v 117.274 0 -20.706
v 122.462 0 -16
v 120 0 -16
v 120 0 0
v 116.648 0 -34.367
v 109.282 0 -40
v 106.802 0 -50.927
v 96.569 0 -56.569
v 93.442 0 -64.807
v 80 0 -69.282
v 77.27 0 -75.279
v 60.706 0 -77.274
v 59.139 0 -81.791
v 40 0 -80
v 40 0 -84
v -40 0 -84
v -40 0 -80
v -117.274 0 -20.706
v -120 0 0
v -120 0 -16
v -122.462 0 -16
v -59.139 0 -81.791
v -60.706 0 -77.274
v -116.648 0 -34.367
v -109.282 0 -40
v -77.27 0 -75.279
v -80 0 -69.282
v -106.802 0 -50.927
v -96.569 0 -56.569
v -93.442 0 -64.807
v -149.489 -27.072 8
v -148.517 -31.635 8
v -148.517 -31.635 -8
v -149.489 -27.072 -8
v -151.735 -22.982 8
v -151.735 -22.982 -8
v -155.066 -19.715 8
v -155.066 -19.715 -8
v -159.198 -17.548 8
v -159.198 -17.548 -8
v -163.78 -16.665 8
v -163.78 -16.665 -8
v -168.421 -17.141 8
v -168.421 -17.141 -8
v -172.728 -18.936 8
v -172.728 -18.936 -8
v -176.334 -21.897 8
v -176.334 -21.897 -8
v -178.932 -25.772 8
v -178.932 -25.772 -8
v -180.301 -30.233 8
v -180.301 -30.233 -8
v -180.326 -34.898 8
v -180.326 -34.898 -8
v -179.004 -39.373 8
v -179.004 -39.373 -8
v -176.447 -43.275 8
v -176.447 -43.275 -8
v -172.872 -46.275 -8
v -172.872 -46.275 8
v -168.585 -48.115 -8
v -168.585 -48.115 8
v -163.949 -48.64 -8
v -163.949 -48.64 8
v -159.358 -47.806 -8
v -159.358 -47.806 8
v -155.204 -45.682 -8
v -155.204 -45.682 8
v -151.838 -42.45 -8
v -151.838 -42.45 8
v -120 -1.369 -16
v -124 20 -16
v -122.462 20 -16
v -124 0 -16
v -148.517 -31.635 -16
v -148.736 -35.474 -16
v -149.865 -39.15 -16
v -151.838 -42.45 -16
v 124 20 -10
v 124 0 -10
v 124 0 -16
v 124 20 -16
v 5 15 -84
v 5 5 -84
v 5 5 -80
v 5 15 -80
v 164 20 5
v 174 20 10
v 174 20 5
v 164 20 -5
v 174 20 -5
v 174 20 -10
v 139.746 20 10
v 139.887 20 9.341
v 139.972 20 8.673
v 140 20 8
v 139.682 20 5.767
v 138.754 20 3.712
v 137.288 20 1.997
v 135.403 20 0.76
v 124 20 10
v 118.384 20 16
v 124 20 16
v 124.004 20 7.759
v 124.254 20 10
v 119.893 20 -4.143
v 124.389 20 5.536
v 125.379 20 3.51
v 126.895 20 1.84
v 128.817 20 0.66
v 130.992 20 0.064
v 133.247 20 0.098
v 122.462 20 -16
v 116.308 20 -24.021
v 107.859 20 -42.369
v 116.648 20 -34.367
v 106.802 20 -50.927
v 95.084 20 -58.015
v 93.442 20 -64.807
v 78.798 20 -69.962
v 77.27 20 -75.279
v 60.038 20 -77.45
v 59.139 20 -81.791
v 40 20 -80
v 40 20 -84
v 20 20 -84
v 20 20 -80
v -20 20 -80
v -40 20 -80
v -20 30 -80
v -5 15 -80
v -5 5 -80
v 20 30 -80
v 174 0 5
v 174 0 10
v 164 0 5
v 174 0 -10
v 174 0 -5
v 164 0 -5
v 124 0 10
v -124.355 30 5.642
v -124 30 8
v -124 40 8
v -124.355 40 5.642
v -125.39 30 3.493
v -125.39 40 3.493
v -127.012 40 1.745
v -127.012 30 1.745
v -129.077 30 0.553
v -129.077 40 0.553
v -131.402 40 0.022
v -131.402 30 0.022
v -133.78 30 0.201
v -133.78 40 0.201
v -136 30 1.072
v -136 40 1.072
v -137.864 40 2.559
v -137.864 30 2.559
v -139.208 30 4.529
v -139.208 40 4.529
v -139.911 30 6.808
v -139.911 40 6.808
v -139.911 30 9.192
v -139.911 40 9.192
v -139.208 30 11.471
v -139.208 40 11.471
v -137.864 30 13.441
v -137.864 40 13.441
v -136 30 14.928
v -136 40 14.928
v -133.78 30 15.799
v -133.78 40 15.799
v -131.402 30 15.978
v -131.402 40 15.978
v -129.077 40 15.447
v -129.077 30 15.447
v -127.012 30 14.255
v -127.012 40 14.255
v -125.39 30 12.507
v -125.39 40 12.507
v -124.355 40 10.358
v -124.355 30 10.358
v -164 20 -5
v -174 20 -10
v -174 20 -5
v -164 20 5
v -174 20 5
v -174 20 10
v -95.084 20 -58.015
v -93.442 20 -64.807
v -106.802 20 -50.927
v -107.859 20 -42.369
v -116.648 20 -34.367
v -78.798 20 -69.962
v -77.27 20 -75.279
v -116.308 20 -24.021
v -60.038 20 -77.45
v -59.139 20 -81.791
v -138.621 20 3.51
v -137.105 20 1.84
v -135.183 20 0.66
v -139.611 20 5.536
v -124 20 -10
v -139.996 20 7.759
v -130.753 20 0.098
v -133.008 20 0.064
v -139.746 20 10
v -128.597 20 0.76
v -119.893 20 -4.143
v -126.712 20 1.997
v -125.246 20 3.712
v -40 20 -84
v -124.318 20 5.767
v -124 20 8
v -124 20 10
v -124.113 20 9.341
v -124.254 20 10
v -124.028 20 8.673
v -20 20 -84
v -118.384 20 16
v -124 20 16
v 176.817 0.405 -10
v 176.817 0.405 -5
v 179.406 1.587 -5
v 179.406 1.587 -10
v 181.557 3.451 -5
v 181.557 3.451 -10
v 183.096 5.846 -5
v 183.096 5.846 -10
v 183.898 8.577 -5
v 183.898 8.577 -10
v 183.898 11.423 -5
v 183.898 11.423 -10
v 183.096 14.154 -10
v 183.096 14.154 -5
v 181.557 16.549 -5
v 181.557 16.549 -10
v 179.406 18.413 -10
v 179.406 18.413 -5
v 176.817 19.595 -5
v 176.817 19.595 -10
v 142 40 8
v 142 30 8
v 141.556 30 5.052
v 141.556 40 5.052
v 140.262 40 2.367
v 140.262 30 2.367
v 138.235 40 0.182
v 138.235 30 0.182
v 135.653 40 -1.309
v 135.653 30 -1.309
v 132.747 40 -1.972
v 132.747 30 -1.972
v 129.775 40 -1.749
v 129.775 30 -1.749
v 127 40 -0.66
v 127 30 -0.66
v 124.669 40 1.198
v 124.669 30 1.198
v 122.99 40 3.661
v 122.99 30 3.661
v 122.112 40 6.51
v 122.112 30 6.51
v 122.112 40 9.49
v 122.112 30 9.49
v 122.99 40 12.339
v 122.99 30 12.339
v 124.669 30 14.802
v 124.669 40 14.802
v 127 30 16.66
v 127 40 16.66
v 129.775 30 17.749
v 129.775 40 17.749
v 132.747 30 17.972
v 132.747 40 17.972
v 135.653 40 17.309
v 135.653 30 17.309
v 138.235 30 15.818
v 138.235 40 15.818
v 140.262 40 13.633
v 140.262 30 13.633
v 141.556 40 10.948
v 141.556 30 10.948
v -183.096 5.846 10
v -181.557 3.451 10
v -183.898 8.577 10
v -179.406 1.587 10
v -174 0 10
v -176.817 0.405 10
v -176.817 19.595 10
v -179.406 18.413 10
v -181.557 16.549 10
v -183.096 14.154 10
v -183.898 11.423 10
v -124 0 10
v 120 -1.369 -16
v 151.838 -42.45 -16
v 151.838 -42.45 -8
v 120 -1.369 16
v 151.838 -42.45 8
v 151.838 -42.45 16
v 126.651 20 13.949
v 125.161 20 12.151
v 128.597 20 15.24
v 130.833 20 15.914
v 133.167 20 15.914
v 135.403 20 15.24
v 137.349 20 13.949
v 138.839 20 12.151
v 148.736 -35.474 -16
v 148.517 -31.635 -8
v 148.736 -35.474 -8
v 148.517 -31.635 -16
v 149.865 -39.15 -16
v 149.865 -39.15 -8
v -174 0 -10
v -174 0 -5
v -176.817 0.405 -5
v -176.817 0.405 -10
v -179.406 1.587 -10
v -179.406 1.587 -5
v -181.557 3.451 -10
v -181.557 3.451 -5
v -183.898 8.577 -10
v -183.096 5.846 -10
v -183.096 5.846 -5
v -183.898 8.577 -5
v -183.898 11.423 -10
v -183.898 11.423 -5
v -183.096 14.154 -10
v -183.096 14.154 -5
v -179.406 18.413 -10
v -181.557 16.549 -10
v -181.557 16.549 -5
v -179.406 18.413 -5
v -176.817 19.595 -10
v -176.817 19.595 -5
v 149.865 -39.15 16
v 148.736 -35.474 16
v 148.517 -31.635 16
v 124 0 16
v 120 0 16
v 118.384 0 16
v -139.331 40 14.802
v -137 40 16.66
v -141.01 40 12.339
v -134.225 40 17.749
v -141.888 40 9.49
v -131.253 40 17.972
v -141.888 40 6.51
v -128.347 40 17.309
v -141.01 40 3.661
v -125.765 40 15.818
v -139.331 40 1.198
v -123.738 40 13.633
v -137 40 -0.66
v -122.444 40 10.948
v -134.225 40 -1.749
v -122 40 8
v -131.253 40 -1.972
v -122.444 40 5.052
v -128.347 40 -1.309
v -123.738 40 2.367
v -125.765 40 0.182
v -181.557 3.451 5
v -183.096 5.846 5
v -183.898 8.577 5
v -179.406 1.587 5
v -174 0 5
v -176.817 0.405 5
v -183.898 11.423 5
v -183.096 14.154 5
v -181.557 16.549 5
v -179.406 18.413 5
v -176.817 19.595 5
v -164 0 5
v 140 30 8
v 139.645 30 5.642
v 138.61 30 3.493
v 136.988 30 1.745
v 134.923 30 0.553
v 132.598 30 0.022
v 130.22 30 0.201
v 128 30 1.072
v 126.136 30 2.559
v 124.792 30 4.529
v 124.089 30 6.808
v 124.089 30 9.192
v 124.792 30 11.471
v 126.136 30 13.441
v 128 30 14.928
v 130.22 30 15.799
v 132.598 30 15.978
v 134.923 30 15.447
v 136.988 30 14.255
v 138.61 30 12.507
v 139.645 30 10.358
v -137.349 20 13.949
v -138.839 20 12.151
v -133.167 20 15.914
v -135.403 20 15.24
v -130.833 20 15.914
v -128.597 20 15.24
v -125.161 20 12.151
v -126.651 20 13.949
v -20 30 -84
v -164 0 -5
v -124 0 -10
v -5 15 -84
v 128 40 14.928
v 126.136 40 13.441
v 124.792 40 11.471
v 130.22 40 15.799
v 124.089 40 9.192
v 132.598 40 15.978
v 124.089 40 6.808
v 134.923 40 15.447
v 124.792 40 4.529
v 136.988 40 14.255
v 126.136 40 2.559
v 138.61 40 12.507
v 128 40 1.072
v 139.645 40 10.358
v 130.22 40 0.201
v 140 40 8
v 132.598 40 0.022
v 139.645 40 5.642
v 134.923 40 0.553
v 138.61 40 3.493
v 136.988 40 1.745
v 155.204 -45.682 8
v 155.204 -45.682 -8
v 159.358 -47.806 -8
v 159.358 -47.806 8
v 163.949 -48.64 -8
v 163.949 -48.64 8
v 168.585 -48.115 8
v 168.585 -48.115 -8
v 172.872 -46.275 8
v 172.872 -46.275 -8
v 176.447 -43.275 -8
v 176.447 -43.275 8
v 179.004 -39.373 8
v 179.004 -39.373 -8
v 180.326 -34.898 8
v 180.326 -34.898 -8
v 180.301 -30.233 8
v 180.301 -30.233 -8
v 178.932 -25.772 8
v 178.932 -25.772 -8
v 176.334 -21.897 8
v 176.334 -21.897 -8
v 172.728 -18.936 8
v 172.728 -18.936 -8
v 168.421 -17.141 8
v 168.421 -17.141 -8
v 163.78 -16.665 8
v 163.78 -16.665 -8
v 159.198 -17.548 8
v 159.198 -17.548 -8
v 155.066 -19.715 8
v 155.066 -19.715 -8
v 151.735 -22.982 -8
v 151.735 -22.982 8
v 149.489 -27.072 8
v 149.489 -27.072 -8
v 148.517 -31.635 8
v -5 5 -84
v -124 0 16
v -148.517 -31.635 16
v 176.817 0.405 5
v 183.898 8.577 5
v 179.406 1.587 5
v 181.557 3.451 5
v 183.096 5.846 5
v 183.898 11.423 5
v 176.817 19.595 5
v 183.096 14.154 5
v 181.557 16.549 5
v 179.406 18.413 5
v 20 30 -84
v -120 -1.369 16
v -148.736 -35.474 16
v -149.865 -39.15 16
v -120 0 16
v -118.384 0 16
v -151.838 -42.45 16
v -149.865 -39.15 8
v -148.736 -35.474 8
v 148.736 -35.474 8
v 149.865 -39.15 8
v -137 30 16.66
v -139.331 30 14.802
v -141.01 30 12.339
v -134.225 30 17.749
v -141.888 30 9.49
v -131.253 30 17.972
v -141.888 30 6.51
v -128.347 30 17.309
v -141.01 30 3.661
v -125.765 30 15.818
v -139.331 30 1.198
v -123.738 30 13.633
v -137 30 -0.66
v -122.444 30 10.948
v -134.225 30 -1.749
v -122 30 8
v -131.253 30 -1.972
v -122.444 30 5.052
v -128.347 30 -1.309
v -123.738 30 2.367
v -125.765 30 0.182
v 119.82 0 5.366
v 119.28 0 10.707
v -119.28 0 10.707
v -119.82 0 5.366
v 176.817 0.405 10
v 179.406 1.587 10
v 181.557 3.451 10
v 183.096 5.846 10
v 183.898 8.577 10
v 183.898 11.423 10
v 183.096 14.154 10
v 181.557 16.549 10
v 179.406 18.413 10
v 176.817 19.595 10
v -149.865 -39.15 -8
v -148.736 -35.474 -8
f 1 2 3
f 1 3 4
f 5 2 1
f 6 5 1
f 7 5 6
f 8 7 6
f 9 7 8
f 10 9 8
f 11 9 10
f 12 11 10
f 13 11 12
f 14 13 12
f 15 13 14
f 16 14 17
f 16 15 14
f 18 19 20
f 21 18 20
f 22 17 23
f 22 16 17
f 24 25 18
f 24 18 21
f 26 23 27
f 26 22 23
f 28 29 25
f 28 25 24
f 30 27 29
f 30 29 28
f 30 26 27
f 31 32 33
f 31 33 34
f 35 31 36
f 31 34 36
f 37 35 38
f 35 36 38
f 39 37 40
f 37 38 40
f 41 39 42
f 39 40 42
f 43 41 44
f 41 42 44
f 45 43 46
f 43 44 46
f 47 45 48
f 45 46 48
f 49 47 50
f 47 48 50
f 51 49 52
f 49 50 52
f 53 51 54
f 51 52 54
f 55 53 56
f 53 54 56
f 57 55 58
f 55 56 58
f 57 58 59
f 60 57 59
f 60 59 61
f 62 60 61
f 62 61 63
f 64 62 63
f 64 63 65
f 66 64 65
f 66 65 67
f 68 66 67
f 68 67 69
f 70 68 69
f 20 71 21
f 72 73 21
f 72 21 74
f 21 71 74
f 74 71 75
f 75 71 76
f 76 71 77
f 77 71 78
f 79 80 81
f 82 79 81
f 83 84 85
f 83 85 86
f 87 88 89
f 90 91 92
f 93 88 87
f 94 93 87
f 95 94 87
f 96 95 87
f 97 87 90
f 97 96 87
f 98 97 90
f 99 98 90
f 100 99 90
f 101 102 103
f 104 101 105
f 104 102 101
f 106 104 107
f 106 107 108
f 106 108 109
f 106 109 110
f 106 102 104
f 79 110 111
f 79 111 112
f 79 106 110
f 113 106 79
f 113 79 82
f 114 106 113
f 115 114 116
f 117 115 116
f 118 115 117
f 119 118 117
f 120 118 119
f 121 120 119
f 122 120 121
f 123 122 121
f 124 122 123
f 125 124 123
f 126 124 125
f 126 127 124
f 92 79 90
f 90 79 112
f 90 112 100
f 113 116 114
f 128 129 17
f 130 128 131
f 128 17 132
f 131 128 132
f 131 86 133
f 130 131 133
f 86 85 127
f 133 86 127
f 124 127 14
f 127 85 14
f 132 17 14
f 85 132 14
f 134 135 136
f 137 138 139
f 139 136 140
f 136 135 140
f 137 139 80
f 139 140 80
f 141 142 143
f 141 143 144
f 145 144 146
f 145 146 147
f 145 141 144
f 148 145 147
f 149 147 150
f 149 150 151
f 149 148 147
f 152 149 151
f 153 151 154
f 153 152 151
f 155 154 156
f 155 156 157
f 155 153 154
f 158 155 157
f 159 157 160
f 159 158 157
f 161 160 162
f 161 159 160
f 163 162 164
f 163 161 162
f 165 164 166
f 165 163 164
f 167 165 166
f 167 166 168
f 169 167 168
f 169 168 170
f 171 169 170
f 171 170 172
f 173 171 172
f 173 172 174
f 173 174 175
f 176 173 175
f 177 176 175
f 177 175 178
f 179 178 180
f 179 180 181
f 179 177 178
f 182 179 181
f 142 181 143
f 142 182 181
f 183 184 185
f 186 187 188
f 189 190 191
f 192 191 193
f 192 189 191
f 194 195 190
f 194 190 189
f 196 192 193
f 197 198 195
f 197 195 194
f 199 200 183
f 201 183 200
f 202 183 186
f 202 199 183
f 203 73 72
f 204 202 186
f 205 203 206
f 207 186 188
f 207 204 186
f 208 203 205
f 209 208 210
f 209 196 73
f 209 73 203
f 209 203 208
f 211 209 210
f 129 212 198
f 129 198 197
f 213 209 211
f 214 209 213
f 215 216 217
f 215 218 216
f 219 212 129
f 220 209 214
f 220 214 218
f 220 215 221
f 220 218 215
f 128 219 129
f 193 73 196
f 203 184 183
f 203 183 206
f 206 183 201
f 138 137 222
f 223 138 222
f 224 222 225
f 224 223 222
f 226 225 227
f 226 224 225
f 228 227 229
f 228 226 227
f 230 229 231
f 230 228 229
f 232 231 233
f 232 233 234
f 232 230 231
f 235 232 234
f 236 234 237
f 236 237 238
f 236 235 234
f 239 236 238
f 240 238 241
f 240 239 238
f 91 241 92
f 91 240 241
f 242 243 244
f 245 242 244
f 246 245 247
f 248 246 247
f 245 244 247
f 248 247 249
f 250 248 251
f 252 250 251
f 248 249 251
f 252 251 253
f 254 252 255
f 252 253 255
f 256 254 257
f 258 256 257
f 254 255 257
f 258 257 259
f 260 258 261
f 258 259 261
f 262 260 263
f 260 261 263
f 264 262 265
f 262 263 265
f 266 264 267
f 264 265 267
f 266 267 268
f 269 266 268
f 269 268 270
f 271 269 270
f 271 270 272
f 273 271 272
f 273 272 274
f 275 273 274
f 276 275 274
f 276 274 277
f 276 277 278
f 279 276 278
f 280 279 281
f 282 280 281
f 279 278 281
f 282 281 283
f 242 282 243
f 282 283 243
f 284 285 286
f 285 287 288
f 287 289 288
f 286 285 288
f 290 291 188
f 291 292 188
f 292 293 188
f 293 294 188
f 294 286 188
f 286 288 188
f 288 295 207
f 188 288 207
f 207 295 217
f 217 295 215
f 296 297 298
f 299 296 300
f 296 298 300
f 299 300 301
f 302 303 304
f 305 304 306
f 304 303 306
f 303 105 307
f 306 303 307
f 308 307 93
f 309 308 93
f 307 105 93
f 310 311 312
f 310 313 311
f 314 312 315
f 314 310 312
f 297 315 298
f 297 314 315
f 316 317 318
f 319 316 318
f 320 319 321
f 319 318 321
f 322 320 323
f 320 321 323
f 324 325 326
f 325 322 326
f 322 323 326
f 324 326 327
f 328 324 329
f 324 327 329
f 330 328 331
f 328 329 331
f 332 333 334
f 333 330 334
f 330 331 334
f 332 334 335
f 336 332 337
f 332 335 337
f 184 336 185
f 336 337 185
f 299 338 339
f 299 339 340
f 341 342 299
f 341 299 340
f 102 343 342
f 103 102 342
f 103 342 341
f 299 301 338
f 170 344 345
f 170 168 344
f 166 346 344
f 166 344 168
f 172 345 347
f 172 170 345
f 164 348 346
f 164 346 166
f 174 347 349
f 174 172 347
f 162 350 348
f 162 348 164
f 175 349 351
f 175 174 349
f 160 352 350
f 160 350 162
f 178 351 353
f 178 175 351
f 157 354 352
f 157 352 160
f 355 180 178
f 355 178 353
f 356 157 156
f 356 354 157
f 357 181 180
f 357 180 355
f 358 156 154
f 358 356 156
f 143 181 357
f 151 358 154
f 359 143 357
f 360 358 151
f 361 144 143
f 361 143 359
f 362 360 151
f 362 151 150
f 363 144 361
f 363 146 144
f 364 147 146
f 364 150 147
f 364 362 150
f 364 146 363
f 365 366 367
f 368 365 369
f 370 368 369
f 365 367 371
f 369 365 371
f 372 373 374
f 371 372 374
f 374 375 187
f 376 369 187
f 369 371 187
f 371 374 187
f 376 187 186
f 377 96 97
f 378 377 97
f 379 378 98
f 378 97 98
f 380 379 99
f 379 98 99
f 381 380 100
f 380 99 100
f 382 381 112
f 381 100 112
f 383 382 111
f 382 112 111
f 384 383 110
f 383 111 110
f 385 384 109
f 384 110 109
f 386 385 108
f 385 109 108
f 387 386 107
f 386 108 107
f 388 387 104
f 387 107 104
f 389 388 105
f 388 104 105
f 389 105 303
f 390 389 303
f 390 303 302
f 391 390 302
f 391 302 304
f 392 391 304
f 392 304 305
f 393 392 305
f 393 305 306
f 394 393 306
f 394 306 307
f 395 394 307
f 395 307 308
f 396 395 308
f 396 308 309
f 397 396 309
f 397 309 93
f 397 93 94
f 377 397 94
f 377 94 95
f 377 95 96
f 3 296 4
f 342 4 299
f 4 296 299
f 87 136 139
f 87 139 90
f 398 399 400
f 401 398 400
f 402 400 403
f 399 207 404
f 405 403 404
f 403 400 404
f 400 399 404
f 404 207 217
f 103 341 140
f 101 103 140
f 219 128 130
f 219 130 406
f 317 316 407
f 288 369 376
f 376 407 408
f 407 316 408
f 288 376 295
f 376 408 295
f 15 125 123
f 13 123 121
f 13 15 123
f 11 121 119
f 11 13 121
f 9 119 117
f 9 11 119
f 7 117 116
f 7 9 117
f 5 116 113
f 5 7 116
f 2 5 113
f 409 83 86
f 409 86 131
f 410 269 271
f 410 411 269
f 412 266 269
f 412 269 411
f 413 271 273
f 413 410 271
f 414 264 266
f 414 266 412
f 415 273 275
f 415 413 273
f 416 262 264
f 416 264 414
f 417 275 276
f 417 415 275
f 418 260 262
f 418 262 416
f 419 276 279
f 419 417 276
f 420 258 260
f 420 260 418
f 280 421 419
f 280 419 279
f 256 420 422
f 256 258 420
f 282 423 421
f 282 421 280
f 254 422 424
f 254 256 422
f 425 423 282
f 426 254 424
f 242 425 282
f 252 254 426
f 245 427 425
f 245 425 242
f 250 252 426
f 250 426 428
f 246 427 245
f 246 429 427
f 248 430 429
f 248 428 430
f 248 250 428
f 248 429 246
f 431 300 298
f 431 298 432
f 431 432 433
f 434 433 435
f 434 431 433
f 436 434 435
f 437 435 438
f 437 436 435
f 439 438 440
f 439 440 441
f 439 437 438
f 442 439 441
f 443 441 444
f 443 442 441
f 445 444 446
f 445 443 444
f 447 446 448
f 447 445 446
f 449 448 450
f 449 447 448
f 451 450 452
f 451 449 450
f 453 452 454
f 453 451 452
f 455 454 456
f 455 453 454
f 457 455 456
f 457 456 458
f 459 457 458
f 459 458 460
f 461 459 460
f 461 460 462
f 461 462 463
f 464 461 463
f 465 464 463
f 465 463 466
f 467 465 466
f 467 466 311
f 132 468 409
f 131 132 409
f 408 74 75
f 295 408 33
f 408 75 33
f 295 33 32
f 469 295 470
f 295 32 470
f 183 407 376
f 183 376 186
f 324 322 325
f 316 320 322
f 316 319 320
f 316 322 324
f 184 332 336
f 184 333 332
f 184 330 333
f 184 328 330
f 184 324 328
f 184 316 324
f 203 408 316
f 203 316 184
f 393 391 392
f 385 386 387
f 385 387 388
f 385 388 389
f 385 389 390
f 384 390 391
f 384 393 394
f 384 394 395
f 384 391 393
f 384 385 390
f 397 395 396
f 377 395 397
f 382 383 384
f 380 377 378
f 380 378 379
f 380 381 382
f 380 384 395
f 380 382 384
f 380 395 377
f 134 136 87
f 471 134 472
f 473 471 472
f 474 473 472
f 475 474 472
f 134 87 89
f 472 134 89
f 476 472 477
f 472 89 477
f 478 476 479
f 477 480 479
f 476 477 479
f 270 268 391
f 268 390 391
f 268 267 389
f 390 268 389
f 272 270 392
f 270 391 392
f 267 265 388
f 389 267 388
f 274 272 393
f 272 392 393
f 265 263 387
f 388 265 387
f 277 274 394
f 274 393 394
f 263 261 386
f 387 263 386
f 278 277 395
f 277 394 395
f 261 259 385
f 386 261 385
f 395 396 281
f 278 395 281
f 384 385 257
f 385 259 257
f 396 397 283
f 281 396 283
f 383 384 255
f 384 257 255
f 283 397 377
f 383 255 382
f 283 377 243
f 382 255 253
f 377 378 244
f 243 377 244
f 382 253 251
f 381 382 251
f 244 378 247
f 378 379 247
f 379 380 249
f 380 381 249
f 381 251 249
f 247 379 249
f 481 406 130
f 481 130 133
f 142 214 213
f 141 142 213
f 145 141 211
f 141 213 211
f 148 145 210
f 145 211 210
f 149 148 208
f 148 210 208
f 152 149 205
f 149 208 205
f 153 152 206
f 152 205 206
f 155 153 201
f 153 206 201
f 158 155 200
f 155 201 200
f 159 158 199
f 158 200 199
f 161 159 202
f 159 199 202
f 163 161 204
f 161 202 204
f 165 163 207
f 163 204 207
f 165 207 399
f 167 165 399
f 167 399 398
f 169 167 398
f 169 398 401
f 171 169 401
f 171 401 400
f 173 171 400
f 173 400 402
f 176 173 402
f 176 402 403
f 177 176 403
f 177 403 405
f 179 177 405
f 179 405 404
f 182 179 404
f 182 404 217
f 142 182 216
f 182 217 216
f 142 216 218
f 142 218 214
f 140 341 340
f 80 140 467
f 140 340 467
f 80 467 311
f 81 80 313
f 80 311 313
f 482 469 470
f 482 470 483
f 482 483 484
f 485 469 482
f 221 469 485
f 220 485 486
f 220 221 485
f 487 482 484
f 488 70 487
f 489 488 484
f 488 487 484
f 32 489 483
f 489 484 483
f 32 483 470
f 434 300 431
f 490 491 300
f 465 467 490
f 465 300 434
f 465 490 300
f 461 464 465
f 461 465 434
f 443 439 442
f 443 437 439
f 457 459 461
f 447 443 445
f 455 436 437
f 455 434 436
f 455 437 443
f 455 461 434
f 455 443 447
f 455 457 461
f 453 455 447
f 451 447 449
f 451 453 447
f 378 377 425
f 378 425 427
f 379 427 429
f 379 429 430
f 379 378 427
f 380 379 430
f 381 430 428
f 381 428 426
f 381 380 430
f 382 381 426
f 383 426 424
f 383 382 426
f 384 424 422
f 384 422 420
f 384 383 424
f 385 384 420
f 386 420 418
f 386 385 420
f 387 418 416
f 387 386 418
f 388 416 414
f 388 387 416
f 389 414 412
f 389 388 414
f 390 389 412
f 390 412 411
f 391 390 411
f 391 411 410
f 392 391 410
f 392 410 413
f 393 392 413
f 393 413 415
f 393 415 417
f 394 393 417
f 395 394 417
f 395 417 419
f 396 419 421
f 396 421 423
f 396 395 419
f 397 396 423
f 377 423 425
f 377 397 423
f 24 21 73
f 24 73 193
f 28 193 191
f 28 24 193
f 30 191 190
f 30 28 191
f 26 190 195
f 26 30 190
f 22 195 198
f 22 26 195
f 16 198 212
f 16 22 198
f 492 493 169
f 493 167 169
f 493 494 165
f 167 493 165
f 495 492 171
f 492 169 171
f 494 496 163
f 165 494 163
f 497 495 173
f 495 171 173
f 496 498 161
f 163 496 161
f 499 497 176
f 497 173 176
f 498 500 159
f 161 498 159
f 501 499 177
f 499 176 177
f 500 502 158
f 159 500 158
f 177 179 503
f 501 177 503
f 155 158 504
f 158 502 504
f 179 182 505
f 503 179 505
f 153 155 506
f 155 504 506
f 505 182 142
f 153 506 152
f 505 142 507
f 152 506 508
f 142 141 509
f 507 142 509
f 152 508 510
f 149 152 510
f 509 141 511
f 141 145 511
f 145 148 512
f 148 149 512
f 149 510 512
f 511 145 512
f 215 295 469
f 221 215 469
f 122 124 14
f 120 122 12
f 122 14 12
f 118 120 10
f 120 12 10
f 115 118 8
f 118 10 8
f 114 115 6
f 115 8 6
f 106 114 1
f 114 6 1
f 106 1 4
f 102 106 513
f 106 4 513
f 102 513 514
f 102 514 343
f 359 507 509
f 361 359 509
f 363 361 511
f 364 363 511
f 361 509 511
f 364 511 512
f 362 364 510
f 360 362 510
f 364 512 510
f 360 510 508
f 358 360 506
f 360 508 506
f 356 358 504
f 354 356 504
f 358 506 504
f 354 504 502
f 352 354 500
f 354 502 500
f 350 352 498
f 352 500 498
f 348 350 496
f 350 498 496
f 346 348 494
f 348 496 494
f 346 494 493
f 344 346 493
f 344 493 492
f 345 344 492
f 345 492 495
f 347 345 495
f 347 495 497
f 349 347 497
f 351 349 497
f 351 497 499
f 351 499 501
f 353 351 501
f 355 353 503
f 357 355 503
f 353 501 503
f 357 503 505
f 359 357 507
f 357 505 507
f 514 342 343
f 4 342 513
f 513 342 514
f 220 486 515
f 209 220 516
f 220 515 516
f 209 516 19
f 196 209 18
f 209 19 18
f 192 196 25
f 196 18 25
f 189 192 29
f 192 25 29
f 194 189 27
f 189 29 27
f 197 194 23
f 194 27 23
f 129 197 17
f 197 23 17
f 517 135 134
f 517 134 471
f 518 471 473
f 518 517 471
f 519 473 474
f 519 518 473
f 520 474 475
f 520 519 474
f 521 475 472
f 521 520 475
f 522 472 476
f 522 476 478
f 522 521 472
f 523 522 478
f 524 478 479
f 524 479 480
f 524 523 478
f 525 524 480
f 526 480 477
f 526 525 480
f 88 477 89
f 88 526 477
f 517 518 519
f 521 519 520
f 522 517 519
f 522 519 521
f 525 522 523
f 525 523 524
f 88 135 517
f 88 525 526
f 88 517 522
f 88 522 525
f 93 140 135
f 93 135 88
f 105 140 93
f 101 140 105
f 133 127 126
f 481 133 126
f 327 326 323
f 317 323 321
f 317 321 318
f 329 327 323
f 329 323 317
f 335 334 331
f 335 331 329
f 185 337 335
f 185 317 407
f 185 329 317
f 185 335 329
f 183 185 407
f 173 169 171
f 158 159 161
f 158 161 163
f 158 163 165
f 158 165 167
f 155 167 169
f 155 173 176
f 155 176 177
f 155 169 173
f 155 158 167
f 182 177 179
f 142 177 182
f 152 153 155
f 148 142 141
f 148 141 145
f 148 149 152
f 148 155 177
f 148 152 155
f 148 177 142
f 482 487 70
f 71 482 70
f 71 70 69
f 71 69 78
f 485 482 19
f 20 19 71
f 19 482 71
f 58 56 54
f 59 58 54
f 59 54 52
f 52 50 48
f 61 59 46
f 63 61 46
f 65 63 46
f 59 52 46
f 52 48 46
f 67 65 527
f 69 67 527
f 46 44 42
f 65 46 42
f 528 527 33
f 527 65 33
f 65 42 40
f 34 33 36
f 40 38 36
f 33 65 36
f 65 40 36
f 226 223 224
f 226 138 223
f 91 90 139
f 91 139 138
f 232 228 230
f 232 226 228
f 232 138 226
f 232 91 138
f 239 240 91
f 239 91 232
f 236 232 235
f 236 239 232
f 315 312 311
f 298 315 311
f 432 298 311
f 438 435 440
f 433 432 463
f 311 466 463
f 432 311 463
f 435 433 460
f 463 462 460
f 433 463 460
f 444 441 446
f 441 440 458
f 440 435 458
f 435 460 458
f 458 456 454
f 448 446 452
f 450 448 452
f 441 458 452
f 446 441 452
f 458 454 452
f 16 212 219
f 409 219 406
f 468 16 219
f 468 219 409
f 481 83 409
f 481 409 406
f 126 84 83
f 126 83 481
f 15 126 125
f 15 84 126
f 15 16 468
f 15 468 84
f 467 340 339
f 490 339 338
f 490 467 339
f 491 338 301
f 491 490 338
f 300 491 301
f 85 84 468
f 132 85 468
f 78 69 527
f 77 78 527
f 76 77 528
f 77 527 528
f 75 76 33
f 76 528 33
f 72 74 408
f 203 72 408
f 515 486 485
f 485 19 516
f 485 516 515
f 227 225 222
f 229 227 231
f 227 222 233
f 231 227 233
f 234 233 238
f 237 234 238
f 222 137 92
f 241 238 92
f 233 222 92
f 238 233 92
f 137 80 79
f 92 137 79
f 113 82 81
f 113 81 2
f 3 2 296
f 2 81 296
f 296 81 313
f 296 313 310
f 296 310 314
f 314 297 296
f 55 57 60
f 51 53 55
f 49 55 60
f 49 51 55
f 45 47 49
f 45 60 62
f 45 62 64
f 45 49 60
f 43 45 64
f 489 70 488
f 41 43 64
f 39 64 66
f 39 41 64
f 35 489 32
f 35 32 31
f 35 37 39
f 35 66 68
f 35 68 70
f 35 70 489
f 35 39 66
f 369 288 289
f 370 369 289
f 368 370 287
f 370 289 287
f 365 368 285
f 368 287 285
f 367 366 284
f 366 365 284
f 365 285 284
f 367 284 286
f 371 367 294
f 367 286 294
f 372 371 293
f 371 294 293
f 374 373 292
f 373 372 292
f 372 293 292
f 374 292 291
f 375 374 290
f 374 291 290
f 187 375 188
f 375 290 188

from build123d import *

# Parameters (mm, degrees)
EXTRUDE_1_DEPTH           = 20
SKETCH_18_W               = 10
SKETCH_18_H               = 10
CUT_EXTRUDE_6_DEPTH       = 10
SKETCH_20_W               = 40
SKETCH_20_H               = 4
EXTRUDE_5_DEPTH           = 10
SKETCH_22_R               = 8
EXTRUDE_7_DEPTH           = 10
EXTRUDE_7_2_DEPTH         = 10
SKETCH_23_R               = 10
SKETCH_23_R_2             = 8
EXTRUDE_8_DEPTH           = 10
EXTRUDE_8_2_DEPTH         = 10
SKETCH_8_W                = 4
SKETCH_8_H                = 32
SKETCH_11_W               = 4
SKETCH_11_H               = 32
SKETCH_25_W               = 246.903686524
SKETCH_25_H               = 75.06139437
CUT_EXTRUDE_7_DEPTH       = 30
SKETCH_26_W               = 20
SKETCH_26_H               = 20
EXTRUDE_9_DEPTH           = 60
SKETCH_28_W               = 20
SKETCH_28_H               = 20
EXTRUDE_10_DEPTH          = 60
CUT_EXTRUDE_8_DEPTH       = 60
SKETCH_29_W               = 20
SKETCH_29_H               = 25.723700811
SKETCH_29_H_2             = 33.540144271
CUT_EXTRUDE_9_DEPTH       = 5
SKETCH_30_R               = 16
CUT_EXTRUDE_10_DEPTH      = 19
CUT_EXTRUDE_10_DEPTH_BACK = 85
SKETCH_31_R               = 16
EXTRUDE_11_DEPTH          = 8


with BuildPart() as part:
    # 草图2 → 凸台-拉伸1 (new body)
    with BuildSketch(Plane(origin=(0, 0, 0), x_dir=(1, 0, 0), z_dir=(0, 1, 0))):
        with BuildLine():
            Line((-40, 84), (40, 84))
            ThreePointArc((40, 84), (124, 0), (40, -84))
            Line((40, -84), (-40, -84))
            ThreePointArc((-40, -84), (-124, 0), (-40, 84))
        make_face()
        with BuildLine():
            Line((-40, 80), (40, 80))
            ThreePointArc((40, 80), (120, 0), (40, -80))
            Line((40, -80), (-40, -80))
            ThreePointArc((-40, -80), (-120, 0), (-40, 80))
        make_face(mode=Mode.SUBTRACT)
    extrude(amount=EXTRUDE_1_DEPTH)

    # 草图18 → 切除-拉伸6 (cut)
    with BuildSketch(Plane(origin=(0, 0, -84), x_dir=(-1, 0, 0), z_dir=(0, 0, -1))):
        with Locations((0, 10)):
            Rectangle(SKETCH_18_W, SKETCH_18_H)
    extrude(amount=-CUT_EXTRUDE_6_DEPTH, mode=Mode.SUBTRACT)

    # 草图20 → 凸台-拉伸5 (add)
    with BuildSketch(Plane(origin=(0, 20, 0), x_dir=(1, 0, 0), z_dir=(0, 1, 0))):
        with Locations((0, 82)):
            Rectangle(SKETCH_20_W, SKETCH_20_H)
    extrude(amount=EXTRUDE_5_DEPTH)

    # 扫描1: sweep along a path in 草图9
    with BuildLine(Plane.XY) as sweep_1_path:
        Line((-124, 20), (-124, 0))
        Line((-124, 0), (-155, -40))
    # 草图8 → 扫描1 (sweep)
    with BuildSketch(Plane(origin=(0, 20, 0), x_dir=(1, 0, 0), z_dir=(0, 1, 0))):
        with Locations((-122, 0)):
            Rectangle(SKETCH_8_W, SKETCH_8_H)
    sweep(path=sweep_1_path.line, transition=Transition.RIGHT)

    # 扫描2: sweep along a path in 草图24
    with BuildLine(Plane.XY) as sweep_2_path:
        Line((124, 20), (124, 0))
        Line((124, 0), (155, -40))
    # 草图11 → 扫描2 (sweep)
    with BuildSketch(Plane(origin=(0, 20, 0), x_dir=(1, 0, 0), z_dir=(0, 1, 0))):
        with Locations((122, 0)):
            Rectangle(SKETCH_11_W, SKETCH_11_H)
    sweep(path=sweep_2_path.line, transition=Transition.RIGHT)

    # 草图25 → 切除-拉伸7 (cut)
    with BuildSketch(Plane(origin=(0, 20, 0), x_dir=(1, 0, 0), z_dir=(0, 1, 0))):
        with Locations((0.98973075, -53.530697185)):
            Rectangle(SKETCH_25_W, SKETCH_25_H)
    extrude(amount=-CUT_EXTRUDE_7_DEPTH, mode=Mode.SUBTRACT)



with BuildPart() as body_2:
    # 草图22 → 凸台-拉伸7 (new body)
    with BuildSketch(Plane(origin=(0, 20, 0), x_dir=(1, 0, 0), z_dir=(0, 1, 0))):
        with Locations((-132, -8)):
            Circle(SKETCH_22_R)
    extrude(amount=EXTRUDE_7_DEPTH)


with BuildPart() as body_3:
    # 草图22 → Extrude 7 2 (new body)
    with BuildSketch(Plane(origin=(0, 20, 0), x_dir=(1, 0, 0), z_dir=(0, 1, 0))):
        with Locations((132, -8)):
            Circle(SKETCH_22_R)
    extrude(amount=EXTRUDE_7_2_DEPTH)


with BuildPart() as body_4:
    # 草图23 → 凸台-拉伸8 (new body)
    with BuildSketch(Plane(origin=(0, 30, 0), x_dir=(1, 0, 0), z_dir=(0, 1, 0))):
        with Locations((-132, -8)):
            Circle(SKETCH_23_R)
        with Locations((-132, -8)):
            Circle(SKETCH_23_R_2, mode=Mode.SUBTRACT)
    extrude(amount=EXTRUDE_8_DEPTH)


with BuildPart() as body_5:
    # 草图23 → Extrude 8 2 (new body)
    with BuildSketch(Plane(origin=(0, 30, 0), x_dir=(1, 0, 0), z_dir=(0, 1, 0))):
        with Locations((132, -8)):
            Circle(SKETCH_23_R)
        with Locations((132, -8)):
            Circle(SKETCH_23_R_2, mode=Mode.SUBTRACT)
    extrude(amount=EXTRUDE_8_2_DEPTH)


with BuildPart() as part_1:
    add(part.part)

    add(body_2.part)  # 凸台-拉伸9 merges body 2
    # 草图26 → 凸台-拉伸9 (add)
    with BuildSketch(Plane.ZY.offset(124)):
        with Locations((0, 10)):
            Rectangle(SKETCH_26_W, SKETCH_26_H)
    extrude(amount=EXTRUDE_9_DEPTH)


    add(body_3.part)  # 凸台-拉伸10 merges body 3
    # 草图28 → 凸台-拉伸10 (add)
    with BuildSketch(Plane(origin=(124, 0, 0), x_dir=(0, 0, -1), z_dir=(1, 0, 0))):
        with Locations((0, 10)):
            Rectangle(SKETCH_28_W, SKETCH_28_H)
    extrude(amount=EXTRUDE_10_DEPTH)

    # 草图27 → 切除-拉伸8 (cut)
    with BuildSketch(Plane.XY.offset(10)):
        with BuildLine():
            Line((-174, 20), (-189, 20))
            Line((-189, 20), (-189, 0))
            Line((-189, 0), (-174, 0))
            ThreePointArc((-174, 0), (-184, 10), (-174, 20))
        make_face()
        with BuildLine():
            Line((174, 20), (191.961940959, 20))
            Line((191.961940959, 20), (191.961940959, 0))
            Line((191.961940959, 0), (174, 0))
            ThreePointArc((174, 0), (184, 10), (174, 20))
        make_face()
    extrude(amount=-CUT_EXTRUDE_8_DEPTH, mode=Mode.SUBTRACT)

    # 草图29 → 切除-拉伸9 (cut, symmetric)
    with BuildSketch(Plane.XY):
        with Locations((-174, 8.750781757)):
            Rectangle(SKETCH_29_W, SKETCH_29_H)
        with Locations((174, 7.12005993)):
            Rectangle(SKETCH_29_W, SKETCH_29_H_2)
    extrude(amount=CUT_EXTRUDE_9_DEPTH, both=True, mode=Mode.SUBTRACT)

    # 草图30 → 切除-拉伸10 (cut, two sides)
    with BuildSketch(Plane.XY) as cut_extrude_10_sk:
        with Locations((-164.484980626, -32.649140015)):
            Circle(SKETCH_30_R)
        with Locations((164.484980626, -32.649140015)):
            Circle(SKETCH_30_R)
    extrude(amount=CUT_EXTRUDE_10_DEPTH, mode=Mode.SUBTRACT)
    extrude(cut_extrude_10_sk.sketch, amount=-CUT_EXTRUDE_10_DEPTH_BACK, mode=Mode.SUBTRACT)

    # 草图31 → 凸台-拉伸11 (add, symmetric)
    with BuildSketch(Plane.XY):
        with Locations((-164.484980626, -32.649140015)):
            Circle(SKETCH_31_R)
        with Locations((164.484980626, -32.649140015)):
            Circle(SKETCH_31_R)
    extrude(amount=EXTRUDE_11_DEPTH, both=True)


solid = Compound([body_4.part, body_5.part, part_1.part])
